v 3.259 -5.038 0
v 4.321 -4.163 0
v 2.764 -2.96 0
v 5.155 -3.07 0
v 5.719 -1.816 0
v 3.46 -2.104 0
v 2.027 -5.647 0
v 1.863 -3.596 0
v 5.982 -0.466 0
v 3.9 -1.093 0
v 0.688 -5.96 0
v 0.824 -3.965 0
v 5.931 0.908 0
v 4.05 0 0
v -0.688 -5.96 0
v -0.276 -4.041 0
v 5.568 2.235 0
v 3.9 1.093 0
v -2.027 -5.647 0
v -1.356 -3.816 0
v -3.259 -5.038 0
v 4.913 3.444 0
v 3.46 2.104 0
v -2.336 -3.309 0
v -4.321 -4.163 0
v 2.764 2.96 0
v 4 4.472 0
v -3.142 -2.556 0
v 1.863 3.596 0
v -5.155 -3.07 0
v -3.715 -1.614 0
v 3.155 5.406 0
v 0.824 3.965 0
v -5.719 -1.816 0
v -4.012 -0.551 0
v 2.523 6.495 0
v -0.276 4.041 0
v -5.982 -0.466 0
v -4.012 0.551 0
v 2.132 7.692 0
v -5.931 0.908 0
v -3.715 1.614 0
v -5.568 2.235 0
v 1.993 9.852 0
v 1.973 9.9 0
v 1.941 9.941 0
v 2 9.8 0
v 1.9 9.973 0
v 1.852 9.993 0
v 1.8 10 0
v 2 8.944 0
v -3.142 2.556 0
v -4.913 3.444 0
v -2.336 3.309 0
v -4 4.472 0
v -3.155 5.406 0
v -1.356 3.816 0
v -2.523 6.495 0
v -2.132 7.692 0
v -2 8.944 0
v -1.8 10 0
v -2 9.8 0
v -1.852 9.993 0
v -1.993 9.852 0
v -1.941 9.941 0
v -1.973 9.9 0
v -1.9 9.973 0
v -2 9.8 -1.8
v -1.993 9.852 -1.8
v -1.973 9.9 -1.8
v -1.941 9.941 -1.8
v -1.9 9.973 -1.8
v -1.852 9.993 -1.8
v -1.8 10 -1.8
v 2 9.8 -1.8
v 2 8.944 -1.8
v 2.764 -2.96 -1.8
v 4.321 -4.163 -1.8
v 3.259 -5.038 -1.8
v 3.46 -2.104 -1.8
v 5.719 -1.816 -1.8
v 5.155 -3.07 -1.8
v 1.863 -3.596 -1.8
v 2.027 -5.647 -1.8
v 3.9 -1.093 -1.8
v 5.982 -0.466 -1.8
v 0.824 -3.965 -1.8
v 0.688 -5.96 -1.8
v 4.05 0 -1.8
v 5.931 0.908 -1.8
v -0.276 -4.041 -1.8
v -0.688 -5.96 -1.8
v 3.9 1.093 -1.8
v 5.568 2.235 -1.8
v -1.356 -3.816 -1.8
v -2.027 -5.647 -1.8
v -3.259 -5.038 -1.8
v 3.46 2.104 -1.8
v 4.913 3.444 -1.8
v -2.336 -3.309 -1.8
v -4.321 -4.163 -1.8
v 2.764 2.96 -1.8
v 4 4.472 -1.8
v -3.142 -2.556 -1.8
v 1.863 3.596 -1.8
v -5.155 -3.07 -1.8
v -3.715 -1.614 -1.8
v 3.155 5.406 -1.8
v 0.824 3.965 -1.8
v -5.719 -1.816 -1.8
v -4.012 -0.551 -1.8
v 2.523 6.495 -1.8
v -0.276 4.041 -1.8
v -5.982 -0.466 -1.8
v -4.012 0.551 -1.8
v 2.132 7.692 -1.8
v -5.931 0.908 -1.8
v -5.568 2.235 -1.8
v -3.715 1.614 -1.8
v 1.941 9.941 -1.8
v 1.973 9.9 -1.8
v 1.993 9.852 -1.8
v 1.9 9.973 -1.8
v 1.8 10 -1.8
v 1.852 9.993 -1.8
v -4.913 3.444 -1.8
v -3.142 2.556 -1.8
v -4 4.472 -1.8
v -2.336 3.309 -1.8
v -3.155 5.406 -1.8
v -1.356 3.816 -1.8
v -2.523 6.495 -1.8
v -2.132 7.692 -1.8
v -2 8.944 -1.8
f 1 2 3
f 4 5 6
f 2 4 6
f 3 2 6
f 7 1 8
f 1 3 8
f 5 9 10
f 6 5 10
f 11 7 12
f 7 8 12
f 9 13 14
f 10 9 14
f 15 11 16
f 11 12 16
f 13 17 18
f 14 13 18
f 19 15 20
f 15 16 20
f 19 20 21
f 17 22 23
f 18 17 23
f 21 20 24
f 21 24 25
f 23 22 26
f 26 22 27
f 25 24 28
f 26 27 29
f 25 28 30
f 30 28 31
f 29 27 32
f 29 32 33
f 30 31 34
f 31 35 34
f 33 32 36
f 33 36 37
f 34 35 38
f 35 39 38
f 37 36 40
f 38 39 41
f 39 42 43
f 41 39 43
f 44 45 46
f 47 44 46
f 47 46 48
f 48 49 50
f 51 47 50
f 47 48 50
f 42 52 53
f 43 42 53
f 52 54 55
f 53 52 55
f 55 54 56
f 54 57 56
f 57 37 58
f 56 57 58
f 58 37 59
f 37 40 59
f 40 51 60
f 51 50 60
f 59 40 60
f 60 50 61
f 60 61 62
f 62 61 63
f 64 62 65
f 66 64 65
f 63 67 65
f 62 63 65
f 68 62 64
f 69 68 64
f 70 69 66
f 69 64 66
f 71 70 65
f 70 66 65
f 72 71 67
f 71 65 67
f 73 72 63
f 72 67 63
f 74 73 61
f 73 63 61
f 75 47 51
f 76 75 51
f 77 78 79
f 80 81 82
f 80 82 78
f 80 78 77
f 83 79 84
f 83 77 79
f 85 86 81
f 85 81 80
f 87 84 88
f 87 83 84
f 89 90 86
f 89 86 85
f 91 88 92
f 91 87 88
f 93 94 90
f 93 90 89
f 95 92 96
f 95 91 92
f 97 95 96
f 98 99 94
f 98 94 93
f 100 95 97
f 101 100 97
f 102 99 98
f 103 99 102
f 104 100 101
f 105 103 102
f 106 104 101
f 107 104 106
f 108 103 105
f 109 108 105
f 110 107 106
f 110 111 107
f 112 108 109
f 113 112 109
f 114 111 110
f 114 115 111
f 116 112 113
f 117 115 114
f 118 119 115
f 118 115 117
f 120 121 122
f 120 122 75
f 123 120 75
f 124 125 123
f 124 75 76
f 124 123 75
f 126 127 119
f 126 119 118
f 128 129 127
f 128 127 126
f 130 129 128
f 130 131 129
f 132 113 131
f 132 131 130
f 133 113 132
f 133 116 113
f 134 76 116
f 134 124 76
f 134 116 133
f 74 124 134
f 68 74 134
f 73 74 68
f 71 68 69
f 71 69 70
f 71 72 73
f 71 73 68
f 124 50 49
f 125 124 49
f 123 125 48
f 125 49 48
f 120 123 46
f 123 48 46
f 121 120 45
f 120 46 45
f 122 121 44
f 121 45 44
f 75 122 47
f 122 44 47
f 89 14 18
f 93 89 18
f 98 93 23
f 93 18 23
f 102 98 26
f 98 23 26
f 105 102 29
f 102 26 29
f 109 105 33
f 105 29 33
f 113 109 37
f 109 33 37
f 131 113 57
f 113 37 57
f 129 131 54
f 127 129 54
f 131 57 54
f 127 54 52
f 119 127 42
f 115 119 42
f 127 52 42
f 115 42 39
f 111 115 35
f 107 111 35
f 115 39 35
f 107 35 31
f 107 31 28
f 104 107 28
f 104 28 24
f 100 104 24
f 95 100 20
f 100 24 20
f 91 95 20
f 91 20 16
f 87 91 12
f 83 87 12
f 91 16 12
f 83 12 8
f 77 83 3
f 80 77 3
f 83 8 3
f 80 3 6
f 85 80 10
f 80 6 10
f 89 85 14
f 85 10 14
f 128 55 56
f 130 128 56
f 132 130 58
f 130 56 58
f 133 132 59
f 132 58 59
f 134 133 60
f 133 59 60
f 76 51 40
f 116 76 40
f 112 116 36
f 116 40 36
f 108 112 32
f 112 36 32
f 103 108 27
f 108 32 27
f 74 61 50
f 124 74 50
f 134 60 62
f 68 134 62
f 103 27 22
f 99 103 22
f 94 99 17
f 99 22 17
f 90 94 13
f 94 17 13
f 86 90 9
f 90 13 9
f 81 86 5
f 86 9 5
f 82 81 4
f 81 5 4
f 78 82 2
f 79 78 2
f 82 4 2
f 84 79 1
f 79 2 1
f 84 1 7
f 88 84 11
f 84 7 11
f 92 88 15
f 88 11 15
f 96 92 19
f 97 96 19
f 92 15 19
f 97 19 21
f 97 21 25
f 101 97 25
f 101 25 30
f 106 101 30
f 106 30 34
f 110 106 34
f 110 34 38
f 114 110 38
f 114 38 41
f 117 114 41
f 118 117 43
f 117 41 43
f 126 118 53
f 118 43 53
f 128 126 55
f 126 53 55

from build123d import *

# Parameters (mm, degrees)
EXTRUDE_1_DEPTH     = 1.8
SKETCH_2_R          = 4.05
CUT_EXTRUDE_1_DEPTH = 1.8


with BuildPart() as part:
    # 草图1 → 凸台-拉伸1 (new body)
    with BuildSketch(Plane.XY):
        with BuildLine():
            Line((-2, 8.94427191), (-2, 9.8))
            ThreePointArc((-2, 9.8), (-1.941421356, 9.941421356), (-1.8, 10))
            Line((-1.8, 10), (1.8, 10))
            ThreePointArc((1.8, 10), (1.941421356, 9.941421356), (2, 9.8))
            Line((2, 9.8), (2, 8.94427191))
            ThreePointArc((2, 8.94427191), (2.522774425, 6.494782167), (4, 4.472135955))
            ThreePointArc((4, 4.472135955), (0, -6), (-4, 4.472135955))
            ThreePointArc((-4, 4.472135955), (-2.522774425, 6.494782167), (-2, 8.94427191))
        make_face()
    extrude(amount=-EXTRUDE_1_DEPTH)

    # 草图2 → 切除-拉伸1 (cut)
    with BuildSketch(Plane.XY):
        Circle(SKETCH_2_R)
    extrude(amount=-CUT_EXTRUDE_1_DEPTH, mode=Mode.SUBTRACT)


solid = part.part
